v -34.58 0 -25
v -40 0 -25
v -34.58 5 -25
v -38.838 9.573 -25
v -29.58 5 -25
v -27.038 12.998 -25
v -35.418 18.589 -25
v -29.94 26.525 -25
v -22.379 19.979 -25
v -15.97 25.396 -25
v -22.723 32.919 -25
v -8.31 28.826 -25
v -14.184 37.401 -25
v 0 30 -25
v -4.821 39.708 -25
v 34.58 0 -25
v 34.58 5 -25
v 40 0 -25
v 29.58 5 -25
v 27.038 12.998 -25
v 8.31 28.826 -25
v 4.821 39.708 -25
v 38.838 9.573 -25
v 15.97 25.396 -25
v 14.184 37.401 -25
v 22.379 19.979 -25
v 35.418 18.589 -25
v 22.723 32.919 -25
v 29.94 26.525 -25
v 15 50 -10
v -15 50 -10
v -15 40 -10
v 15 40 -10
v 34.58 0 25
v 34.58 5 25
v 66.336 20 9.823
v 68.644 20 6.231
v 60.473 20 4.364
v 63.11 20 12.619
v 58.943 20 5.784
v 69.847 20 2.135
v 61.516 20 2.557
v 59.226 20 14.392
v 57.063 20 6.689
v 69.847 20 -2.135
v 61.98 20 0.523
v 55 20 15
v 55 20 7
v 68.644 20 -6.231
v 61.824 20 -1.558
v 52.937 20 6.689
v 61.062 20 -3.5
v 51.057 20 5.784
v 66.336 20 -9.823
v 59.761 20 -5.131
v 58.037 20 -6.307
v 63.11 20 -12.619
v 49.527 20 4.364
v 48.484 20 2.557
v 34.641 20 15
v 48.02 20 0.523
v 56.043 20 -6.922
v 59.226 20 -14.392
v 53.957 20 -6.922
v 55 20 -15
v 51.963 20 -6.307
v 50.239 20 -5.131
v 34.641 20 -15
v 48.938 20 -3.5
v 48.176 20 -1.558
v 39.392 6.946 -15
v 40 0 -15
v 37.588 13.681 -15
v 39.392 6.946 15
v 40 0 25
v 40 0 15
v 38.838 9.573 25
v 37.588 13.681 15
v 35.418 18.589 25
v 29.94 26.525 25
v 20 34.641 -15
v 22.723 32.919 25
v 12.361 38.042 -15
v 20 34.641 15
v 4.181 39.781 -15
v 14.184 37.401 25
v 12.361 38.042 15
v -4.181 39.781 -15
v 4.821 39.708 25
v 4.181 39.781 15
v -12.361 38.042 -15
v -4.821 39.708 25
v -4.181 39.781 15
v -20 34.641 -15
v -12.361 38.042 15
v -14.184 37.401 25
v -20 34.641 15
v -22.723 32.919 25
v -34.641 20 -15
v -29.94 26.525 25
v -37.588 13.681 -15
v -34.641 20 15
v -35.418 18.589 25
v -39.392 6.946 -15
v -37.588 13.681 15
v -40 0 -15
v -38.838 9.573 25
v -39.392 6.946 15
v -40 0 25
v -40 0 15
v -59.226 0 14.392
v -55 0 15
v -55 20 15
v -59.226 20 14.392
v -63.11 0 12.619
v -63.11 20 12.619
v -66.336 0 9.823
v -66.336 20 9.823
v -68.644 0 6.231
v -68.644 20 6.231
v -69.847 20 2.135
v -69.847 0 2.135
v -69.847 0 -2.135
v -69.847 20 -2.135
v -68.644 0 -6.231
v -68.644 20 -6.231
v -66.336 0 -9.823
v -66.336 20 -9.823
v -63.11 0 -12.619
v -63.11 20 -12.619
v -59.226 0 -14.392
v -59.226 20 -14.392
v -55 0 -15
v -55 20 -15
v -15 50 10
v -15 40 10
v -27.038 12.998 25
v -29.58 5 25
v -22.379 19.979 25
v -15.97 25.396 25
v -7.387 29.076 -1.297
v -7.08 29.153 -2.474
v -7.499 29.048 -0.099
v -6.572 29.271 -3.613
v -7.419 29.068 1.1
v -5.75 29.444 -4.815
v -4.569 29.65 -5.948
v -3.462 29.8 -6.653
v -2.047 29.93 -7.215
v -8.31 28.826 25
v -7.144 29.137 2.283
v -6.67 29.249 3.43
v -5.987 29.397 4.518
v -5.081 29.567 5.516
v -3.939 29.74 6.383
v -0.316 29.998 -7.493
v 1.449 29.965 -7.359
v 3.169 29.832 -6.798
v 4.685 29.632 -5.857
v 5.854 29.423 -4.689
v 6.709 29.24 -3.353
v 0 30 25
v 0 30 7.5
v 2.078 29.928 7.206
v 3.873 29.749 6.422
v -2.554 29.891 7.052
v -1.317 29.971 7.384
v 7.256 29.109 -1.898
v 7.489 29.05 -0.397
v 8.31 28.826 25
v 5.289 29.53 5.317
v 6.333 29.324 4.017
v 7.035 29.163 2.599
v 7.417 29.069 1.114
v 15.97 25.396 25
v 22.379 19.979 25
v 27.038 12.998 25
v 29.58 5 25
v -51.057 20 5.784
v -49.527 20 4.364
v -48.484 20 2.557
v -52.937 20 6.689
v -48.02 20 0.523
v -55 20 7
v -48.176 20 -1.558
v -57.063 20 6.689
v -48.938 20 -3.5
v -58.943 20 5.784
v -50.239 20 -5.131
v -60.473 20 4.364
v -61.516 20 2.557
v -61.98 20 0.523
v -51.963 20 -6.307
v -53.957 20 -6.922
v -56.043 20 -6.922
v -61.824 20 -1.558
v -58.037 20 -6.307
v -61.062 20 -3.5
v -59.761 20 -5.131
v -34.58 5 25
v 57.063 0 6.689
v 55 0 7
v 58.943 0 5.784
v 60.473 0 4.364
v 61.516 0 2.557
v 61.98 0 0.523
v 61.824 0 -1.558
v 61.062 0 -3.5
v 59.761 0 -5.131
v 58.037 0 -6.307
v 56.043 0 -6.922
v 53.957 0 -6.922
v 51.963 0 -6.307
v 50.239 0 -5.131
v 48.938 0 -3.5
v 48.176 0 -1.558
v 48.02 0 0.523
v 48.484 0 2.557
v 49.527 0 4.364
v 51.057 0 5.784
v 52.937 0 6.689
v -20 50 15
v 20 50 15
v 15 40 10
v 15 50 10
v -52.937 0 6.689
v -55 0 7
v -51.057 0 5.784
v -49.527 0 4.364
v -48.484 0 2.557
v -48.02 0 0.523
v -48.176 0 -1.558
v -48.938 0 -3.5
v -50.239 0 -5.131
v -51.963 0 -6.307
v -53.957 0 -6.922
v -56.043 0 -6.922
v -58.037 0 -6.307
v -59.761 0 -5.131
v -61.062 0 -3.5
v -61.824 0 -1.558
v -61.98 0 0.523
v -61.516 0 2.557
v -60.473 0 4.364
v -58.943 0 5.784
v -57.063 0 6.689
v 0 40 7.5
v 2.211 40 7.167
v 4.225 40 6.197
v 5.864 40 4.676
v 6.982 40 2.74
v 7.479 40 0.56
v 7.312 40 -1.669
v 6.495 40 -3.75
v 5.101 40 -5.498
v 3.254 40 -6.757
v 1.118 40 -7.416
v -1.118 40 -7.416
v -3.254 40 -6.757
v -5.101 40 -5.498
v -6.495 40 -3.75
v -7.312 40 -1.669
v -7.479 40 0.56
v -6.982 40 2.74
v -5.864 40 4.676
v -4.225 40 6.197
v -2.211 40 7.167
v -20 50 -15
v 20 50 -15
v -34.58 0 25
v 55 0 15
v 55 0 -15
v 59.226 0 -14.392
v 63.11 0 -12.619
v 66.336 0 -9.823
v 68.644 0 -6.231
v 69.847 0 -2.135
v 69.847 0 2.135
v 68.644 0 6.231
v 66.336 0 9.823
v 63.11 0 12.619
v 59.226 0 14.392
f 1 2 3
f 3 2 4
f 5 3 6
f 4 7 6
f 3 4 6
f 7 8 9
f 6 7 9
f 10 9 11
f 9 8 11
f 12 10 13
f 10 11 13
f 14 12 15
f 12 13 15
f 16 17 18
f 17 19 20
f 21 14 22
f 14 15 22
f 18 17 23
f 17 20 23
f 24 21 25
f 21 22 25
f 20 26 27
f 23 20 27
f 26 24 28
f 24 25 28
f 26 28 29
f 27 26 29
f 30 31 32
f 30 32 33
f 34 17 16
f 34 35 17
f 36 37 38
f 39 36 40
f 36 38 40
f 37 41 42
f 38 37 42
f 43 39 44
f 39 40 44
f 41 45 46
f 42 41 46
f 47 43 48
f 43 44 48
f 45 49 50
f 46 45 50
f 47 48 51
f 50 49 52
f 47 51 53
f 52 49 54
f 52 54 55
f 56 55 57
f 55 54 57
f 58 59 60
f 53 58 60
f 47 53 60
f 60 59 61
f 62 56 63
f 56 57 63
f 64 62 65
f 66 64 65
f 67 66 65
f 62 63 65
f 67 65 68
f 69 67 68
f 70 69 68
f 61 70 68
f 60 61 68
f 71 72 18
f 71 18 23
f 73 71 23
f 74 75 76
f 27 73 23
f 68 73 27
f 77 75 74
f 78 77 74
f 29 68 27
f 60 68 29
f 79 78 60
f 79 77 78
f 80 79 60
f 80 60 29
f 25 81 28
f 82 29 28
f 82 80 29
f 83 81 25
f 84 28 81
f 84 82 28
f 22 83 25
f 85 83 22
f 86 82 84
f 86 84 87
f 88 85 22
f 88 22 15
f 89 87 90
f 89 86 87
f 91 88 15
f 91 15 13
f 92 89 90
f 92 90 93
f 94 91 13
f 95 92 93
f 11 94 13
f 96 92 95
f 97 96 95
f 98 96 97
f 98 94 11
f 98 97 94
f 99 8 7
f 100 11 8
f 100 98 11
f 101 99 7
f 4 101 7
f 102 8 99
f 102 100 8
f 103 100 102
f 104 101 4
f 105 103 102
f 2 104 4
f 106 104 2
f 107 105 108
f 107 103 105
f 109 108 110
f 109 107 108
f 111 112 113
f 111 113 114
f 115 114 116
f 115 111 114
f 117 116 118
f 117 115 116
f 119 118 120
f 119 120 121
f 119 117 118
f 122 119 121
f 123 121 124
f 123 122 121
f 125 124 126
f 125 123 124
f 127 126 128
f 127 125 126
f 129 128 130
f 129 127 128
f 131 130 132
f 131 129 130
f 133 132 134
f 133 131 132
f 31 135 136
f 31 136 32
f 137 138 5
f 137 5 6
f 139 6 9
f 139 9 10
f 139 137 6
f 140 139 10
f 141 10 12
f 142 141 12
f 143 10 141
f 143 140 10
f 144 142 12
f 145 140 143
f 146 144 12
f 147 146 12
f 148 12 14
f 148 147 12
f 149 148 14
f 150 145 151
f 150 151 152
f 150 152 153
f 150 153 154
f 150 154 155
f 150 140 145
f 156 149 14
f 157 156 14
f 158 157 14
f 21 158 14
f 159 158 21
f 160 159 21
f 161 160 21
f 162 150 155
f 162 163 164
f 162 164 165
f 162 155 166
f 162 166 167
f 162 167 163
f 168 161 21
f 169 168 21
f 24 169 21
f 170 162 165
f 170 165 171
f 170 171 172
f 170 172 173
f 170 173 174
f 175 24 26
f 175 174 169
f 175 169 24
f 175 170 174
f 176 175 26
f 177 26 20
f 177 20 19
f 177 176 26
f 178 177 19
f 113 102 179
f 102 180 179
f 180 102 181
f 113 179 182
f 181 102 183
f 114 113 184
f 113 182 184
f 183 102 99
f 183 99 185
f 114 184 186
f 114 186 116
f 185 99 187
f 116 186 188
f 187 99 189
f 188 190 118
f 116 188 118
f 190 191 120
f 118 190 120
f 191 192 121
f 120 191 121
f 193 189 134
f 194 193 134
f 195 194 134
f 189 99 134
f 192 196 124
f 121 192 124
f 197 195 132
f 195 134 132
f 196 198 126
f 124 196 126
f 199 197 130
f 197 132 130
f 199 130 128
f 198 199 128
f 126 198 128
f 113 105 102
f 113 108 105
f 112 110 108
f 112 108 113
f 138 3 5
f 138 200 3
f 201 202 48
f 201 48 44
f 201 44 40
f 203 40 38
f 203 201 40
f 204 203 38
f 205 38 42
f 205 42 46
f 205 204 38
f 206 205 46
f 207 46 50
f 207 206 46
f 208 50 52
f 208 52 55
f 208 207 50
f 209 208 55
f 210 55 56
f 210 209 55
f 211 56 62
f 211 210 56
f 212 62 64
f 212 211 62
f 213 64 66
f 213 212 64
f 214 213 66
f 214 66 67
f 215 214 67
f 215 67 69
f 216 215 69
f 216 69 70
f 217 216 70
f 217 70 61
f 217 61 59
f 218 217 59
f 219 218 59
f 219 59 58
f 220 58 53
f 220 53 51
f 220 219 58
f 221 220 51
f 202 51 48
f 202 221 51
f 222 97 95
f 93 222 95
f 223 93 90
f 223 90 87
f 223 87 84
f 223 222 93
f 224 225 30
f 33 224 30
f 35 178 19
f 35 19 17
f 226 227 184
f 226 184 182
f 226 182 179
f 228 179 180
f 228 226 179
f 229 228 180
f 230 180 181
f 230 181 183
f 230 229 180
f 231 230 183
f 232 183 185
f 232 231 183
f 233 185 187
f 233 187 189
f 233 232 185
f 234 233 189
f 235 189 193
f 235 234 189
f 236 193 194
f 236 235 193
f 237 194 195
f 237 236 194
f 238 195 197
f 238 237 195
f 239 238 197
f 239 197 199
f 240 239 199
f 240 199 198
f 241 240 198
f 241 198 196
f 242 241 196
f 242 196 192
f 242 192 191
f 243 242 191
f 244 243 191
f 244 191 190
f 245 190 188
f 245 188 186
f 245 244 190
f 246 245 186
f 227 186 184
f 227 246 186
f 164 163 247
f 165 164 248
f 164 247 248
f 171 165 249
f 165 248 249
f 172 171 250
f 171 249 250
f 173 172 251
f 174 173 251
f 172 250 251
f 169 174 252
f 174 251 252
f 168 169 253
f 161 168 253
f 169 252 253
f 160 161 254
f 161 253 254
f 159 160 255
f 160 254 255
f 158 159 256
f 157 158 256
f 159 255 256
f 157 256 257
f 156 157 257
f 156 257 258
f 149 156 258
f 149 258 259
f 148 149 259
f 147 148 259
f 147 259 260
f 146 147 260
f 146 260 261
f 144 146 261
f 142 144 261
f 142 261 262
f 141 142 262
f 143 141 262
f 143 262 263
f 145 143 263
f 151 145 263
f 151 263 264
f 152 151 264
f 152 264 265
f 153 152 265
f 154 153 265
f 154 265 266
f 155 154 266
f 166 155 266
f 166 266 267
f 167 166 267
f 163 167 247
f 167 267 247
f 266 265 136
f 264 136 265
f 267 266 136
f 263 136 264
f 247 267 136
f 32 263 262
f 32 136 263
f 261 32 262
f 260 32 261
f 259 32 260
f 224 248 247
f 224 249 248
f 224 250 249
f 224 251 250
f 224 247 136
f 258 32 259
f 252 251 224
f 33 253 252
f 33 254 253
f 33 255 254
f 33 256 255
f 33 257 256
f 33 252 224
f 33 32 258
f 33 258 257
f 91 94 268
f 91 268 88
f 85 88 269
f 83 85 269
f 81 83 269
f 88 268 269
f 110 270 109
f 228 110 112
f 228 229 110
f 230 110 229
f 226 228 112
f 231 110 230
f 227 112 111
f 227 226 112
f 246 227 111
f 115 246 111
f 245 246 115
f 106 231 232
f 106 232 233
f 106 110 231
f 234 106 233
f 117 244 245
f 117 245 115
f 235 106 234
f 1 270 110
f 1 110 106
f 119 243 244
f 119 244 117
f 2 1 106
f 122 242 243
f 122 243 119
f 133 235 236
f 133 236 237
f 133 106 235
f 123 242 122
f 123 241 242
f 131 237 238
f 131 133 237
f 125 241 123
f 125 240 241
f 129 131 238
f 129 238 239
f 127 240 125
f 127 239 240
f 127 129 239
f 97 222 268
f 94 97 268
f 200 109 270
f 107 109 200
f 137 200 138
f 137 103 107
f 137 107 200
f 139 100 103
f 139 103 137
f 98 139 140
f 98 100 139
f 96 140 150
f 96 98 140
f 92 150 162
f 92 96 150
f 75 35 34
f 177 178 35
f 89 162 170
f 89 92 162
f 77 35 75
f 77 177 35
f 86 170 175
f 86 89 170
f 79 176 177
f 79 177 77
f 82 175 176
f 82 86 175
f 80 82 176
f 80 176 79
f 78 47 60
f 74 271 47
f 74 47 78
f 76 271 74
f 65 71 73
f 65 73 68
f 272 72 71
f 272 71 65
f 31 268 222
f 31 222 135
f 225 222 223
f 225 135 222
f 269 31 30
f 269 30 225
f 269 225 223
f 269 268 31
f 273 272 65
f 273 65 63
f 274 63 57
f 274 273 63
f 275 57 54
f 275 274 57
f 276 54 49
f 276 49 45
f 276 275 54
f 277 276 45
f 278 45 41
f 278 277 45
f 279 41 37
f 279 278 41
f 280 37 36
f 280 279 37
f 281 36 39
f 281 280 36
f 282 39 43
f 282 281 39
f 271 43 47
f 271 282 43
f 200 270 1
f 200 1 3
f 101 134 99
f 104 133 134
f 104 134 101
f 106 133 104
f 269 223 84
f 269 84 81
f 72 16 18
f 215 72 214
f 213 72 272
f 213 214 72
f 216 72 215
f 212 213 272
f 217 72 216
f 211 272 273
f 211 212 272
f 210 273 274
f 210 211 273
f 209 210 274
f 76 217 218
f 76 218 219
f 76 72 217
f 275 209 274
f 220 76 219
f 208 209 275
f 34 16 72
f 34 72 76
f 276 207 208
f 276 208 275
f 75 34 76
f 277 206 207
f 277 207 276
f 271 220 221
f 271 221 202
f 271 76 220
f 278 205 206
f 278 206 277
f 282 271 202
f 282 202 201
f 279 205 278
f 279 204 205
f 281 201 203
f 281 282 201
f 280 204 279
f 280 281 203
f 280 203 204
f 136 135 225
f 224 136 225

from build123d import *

# Parameters (mm, degrees)
BOSS_EXTRUDE3_DEPTH      = 25
SKETCH5_R                = 7
BOSS_EXTRUDE4_DEPTH      = 20
BOSS_EXTRUDE6_REACH      = 91.582
BOSS_EXTRUDE6_END_RADIUS = 40
SKETCH8_W                = 40
SKETCH8_H                = 30
SKETCH9_W                = 30
SKETCH9_H                = 20
CUT_EXTRUDE3_DEPTH       = 10
SKETCH10_R               = 7.5
CUT_EXTRUDE4_DEPTH       = 90.582364336


with BuildPart() as part:
    # Sketch4 → Boss-Extrude3 (new, symmetric)
    with BuildSketch(Plane.XY):
        with BuildLine():
            Line((-34.580398915, 5), (-29.580398915, 5))
            ThreePointArc((-29.580398915, 5), (0, 30), (29.580398915, 5))
            Line((29.580398915, 5), (34.580398915, 5))
            Line((34.580398915, 5), (34.580398915, 0))
            Line((34.580398915, 0), (40, 0))
            ThreePointArc((40, 0), (0, 40), (-40, 0))
            Line((-40, 0), (-34.580398915, 0))
            Line((-34.580398915, 0), (-34.580398915, 5))
        make_face()
    extrude(amount=BOSS_EXTRUDE3_DEPTH, both=True)

    # Sketch5 → Boss-Extrude4 (add)
    # profile 1 of 2: a face of its own
    with BuildSketch(Plane(origin=(0, 0, 0), x_dir=(1, 0, 0), z_dir=(0, 1, 0))):
        with BuildLine():
            Line((-55, 15), (-34.580398915, 15))
            Line((-34.580398915, 15), (-34.580398915, -15))
            Line((-34.580398915, -15), (-55, -15))
            ThreePointArc((-55, -15), (-70, 0), (-55, 15))
        make_face()
        with Locations(Location((-55, 0, 0), (0, 0, 270))):
            Circle(SKETCH5_R, mode=Mode.SUBTRACT)
    # profile 2 of 2: a face of its own
    with BuildSketch(Plane(origin=(0, 0, 0), x_dir=(1, 0, 0), z_dir=(0, 1, 0))):
        with BuildLine():
            Line((34.580398915, 15), (55, 15))
            ThreePointArc((55, 15), (70, 0), (55, -15))
            Line((55, -15), (34.580398915, -15))
            Line((34.580398915, -15), (34.580398915, 15))
        make_face()
        with Locations(Location((55, 0, 0), (0, 0, 270))):
            Circle(SKETCH5_R, mode=Mode.SUBTRACT)
    extrude(amount=BOSS_EXTRUDE4_DEPTH)

    # Boss-Extrude6: up to this cylinder (the profile starts outside it)
    boss_extrude6_end = Plane(origin=(0, 0, 0), z_dir=(0, 0, -1)) * Cylinder(BOSS_EXTRUDE6_END_RADIUS, 264.164, mode=Mode.PRIVATE)
    # Sketch8 → Boss-Extrude6 (add, up to the surface)
    with BuildSketch(Plane(origin=(0, 50, 0), x_dir=(1, 0, 0), z_dir=(0, 1, 0)), mode=Mode.PRIVATE) as boss_extrude6_sk1:
        Rectangle(SKETCH8_W, SKETCH8_H)
    boss_extrude6_tool1 = extrude(boss_extrude6_sk1.sketch, amount=-BOSS_EXTRUDE6_REACH, mode=Mode.PRIVATE) - boss_extrude6_end
    add(boss_extrude6_tool1.solids().sort_by_distance((0, 50, 0))[0])

    # Sketch9 → Cut-Extrude3 (cut)
    with BuildSketch(Plane(origin=(0, 50, 0), x_dir=(1, 0, 0), z_dir=(0, 1, 0))):
        Rectangle(SKETCH9_W, SKETCH9_H)
    extrude(amount=-CUT_EXTRUDE3_DEPTH, mode=Mode.SUBTRACT)

    # Sketch10 → Cut-Extrude4 (cut, through all)
    with BuildSketch(Plane(origin=(0, 50, 0), x_dir=(1, 0, 0), z_dir=(0, 1, 0))):
        with Locations(Location((0, 0, 0), (0, 0, 270))):
            Circle(SKETCH10_R)
    extrude(amount=-CUT_EXTRUDE4_DEPTH, mode=Mode.SUBTRACT)


solid = part.part
